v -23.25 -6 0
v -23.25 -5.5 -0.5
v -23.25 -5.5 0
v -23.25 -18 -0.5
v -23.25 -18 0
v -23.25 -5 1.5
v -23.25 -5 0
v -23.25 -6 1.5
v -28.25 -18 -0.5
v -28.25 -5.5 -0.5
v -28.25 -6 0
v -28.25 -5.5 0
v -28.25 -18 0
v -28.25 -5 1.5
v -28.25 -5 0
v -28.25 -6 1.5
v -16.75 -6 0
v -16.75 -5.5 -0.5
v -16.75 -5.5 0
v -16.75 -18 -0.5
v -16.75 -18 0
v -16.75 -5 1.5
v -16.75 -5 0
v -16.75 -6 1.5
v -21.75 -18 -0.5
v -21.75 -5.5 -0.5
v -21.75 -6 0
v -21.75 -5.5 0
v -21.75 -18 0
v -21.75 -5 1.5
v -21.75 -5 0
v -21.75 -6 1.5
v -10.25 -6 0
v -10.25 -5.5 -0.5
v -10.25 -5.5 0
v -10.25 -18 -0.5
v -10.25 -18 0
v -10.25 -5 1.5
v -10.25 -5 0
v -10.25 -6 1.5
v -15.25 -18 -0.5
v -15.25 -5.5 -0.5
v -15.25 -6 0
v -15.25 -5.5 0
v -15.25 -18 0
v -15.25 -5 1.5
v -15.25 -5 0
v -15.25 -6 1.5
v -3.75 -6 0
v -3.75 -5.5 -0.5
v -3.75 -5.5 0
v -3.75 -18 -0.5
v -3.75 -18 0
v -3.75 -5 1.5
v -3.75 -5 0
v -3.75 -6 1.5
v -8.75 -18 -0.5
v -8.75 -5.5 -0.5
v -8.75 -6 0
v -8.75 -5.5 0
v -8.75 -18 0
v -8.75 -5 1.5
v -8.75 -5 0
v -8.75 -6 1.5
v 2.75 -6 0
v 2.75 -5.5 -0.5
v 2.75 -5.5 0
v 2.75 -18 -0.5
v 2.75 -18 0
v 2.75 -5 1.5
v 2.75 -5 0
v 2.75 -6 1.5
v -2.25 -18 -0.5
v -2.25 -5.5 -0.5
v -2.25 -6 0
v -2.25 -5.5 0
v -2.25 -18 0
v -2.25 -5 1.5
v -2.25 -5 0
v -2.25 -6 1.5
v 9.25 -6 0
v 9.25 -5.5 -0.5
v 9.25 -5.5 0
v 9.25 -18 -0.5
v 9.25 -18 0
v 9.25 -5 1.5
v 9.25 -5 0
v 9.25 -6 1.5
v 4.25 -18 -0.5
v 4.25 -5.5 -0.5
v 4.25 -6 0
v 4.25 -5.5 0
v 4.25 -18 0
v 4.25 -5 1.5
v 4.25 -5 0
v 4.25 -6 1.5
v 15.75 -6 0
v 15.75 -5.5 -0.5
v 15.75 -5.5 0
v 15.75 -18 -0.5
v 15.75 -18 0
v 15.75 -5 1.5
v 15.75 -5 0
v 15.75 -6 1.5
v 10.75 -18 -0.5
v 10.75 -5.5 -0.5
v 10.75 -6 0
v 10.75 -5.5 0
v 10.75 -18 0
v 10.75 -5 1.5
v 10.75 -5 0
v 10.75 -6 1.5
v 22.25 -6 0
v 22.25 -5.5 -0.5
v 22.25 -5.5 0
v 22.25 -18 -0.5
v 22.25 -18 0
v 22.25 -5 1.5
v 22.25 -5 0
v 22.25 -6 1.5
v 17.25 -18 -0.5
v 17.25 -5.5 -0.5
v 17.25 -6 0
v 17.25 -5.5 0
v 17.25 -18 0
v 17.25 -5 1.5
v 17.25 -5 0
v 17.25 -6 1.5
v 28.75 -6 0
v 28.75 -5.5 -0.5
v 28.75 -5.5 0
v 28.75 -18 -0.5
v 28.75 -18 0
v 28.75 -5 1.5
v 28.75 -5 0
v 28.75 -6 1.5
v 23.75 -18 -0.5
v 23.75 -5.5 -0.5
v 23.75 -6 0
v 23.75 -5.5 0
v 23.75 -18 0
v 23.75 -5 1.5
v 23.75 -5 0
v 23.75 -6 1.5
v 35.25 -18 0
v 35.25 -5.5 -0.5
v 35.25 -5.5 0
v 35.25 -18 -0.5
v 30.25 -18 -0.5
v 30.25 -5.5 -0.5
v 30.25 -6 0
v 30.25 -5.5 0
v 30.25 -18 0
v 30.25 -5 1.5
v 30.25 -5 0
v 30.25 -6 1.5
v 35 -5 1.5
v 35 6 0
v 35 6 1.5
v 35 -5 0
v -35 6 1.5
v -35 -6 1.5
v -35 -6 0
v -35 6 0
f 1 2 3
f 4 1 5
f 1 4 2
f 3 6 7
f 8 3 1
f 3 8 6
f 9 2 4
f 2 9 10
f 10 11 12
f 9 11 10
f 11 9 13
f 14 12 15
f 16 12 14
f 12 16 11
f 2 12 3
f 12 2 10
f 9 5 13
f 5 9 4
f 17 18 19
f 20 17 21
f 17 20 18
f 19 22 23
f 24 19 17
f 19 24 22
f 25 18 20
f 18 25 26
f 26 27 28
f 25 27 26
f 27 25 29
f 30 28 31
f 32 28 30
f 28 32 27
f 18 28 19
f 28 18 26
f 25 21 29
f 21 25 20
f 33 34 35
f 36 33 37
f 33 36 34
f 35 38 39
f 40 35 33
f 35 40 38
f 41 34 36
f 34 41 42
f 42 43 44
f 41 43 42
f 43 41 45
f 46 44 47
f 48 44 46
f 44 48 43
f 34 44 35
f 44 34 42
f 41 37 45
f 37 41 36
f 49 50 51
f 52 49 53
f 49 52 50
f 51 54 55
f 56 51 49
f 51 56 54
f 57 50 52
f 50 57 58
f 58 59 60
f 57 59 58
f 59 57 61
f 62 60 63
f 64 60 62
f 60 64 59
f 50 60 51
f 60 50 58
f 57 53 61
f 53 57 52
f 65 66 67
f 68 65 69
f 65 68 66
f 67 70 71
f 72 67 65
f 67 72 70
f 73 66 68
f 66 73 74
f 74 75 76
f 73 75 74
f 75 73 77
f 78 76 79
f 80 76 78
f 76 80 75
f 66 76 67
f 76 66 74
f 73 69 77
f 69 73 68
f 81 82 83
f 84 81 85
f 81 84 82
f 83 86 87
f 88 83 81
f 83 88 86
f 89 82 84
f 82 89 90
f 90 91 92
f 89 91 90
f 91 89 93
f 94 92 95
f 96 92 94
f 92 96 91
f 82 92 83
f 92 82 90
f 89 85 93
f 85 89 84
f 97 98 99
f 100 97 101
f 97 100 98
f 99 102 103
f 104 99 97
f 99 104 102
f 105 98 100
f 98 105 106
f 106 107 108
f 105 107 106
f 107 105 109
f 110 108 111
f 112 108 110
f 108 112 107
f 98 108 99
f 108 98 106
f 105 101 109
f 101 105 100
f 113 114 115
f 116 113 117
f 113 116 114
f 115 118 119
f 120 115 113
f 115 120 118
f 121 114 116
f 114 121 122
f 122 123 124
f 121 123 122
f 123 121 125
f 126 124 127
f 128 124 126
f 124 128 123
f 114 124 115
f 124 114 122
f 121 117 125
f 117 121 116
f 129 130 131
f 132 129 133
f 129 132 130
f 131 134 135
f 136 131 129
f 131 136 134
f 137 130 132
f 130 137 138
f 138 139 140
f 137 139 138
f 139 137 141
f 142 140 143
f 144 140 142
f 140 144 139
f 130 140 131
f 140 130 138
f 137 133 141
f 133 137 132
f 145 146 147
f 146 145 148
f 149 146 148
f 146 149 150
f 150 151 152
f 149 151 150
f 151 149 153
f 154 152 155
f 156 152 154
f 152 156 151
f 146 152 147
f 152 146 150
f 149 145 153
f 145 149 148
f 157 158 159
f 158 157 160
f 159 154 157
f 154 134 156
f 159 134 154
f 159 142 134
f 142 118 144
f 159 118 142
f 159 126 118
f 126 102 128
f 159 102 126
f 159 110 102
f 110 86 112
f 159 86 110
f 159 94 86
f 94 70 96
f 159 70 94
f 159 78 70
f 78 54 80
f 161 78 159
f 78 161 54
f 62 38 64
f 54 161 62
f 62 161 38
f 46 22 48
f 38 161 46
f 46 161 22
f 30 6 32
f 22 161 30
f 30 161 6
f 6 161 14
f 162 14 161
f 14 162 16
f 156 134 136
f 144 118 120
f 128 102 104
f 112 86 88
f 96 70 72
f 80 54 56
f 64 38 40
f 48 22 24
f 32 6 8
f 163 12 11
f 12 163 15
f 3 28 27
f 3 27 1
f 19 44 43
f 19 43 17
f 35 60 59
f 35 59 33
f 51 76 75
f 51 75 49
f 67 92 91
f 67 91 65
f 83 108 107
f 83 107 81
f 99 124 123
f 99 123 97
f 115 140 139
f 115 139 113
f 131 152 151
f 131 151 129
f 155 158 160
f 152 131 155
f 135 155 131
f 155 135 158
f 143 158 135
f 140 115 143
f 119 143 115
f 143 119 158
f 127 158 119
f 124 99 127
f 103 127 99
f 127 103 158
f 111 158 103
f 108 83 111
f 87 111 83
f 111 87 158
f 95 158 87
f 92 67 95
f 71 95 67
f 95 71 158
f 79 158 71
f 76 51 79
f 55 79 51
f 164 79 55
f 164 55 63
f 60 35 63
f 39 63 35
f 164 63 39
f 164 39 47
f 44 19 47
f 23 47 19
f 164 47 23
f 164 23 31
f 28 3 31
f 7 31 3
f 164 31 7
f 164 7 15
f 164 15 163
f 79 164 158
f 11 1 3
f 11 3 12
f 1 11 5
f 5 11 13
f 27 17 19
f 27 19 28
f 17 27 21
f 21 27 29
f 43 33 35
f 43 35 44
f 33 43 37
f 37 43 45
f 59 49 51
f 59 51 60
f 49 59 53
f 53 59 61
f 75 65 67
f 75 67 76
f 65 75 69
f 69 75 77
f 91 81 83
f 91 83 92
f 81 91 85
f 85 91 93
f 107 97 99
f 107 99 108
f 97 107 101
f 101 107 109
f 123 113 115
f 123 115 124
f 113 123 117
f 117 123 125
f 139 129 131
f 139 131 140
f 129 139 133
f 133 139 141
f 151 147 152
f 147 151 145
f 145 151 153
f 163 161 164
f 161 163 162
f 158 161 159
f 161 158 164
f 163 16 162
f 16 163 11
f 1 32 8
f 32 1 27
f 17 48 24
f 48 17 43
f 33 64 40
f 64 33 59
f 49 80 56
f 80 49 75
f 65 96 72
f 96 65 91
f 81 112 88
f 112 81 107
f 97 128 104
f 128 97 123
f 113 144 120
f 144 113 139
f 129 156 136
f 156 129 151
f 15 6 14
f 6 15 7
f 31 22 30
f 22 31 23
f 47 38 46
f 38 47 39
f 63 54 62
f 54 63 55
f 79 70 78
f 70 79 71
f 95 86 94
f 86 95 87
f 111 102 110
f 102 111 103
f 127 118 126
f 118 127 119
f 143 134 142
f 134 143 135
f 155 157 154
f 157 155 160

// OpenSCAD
// 10-well comb for agarose gel casting
// Print orientation: flat on bed, teeth pointing down (-Z)

// ---------- Parameters ----------
plate_thickness = 1.5;    // mm: base plate thickness
spine_length    = 70;     // mm: spine length (X)
spine_width     = 12;     // mm: spine width (Y)
tooth_count     = 10;     // number of wells
tooth_width     = 5.0;    // mm: tooth width (X)
tooth_length    = 12;     // mm: tooth length (Y)
gap             = 1.5;    // mm: gap between neighbouring teeth
eps             = 0.5;    // mm: cutter overshoot past faces

$fn = 64;

// ---------- Derived ----------
pitch      = tooth_width + gap;              // centre-to-centre spacing
row_offset = (tooth_count - 1) * gap / 2;    // shift to centre row on spine
teeth_area = tooth_width * tooth_length;

// ---------- Model ----------
difference() {
    union() {
        // Base plate
        translate([-spine_length / 2, -spine_width / 2, 0])
            cube([spine_length, spine_width, plate_thickness]);

        // Teeth (extend below z = 0 for a clean cut)
        for (i = [0 : tooth_count - 1])
            translate([-spine_length / 2 + row_offset + i * pitch,
                       -spine_width / 2 - tooth_length,
                       -eps])
                cube([tooth_width, tooth_length + eps, plate_thickness]);
    }

    // Remove the well cavities
    for (i = [0 : tooth_count - 1])
        translate([-spine_length / 2 + row_offset + i * pitch,
                   -spine_width / 2 - tooth_length,
                   0])
            cube([tooth_width, tooth_length + 2 * eps, plate_thickness + eps]);
}
